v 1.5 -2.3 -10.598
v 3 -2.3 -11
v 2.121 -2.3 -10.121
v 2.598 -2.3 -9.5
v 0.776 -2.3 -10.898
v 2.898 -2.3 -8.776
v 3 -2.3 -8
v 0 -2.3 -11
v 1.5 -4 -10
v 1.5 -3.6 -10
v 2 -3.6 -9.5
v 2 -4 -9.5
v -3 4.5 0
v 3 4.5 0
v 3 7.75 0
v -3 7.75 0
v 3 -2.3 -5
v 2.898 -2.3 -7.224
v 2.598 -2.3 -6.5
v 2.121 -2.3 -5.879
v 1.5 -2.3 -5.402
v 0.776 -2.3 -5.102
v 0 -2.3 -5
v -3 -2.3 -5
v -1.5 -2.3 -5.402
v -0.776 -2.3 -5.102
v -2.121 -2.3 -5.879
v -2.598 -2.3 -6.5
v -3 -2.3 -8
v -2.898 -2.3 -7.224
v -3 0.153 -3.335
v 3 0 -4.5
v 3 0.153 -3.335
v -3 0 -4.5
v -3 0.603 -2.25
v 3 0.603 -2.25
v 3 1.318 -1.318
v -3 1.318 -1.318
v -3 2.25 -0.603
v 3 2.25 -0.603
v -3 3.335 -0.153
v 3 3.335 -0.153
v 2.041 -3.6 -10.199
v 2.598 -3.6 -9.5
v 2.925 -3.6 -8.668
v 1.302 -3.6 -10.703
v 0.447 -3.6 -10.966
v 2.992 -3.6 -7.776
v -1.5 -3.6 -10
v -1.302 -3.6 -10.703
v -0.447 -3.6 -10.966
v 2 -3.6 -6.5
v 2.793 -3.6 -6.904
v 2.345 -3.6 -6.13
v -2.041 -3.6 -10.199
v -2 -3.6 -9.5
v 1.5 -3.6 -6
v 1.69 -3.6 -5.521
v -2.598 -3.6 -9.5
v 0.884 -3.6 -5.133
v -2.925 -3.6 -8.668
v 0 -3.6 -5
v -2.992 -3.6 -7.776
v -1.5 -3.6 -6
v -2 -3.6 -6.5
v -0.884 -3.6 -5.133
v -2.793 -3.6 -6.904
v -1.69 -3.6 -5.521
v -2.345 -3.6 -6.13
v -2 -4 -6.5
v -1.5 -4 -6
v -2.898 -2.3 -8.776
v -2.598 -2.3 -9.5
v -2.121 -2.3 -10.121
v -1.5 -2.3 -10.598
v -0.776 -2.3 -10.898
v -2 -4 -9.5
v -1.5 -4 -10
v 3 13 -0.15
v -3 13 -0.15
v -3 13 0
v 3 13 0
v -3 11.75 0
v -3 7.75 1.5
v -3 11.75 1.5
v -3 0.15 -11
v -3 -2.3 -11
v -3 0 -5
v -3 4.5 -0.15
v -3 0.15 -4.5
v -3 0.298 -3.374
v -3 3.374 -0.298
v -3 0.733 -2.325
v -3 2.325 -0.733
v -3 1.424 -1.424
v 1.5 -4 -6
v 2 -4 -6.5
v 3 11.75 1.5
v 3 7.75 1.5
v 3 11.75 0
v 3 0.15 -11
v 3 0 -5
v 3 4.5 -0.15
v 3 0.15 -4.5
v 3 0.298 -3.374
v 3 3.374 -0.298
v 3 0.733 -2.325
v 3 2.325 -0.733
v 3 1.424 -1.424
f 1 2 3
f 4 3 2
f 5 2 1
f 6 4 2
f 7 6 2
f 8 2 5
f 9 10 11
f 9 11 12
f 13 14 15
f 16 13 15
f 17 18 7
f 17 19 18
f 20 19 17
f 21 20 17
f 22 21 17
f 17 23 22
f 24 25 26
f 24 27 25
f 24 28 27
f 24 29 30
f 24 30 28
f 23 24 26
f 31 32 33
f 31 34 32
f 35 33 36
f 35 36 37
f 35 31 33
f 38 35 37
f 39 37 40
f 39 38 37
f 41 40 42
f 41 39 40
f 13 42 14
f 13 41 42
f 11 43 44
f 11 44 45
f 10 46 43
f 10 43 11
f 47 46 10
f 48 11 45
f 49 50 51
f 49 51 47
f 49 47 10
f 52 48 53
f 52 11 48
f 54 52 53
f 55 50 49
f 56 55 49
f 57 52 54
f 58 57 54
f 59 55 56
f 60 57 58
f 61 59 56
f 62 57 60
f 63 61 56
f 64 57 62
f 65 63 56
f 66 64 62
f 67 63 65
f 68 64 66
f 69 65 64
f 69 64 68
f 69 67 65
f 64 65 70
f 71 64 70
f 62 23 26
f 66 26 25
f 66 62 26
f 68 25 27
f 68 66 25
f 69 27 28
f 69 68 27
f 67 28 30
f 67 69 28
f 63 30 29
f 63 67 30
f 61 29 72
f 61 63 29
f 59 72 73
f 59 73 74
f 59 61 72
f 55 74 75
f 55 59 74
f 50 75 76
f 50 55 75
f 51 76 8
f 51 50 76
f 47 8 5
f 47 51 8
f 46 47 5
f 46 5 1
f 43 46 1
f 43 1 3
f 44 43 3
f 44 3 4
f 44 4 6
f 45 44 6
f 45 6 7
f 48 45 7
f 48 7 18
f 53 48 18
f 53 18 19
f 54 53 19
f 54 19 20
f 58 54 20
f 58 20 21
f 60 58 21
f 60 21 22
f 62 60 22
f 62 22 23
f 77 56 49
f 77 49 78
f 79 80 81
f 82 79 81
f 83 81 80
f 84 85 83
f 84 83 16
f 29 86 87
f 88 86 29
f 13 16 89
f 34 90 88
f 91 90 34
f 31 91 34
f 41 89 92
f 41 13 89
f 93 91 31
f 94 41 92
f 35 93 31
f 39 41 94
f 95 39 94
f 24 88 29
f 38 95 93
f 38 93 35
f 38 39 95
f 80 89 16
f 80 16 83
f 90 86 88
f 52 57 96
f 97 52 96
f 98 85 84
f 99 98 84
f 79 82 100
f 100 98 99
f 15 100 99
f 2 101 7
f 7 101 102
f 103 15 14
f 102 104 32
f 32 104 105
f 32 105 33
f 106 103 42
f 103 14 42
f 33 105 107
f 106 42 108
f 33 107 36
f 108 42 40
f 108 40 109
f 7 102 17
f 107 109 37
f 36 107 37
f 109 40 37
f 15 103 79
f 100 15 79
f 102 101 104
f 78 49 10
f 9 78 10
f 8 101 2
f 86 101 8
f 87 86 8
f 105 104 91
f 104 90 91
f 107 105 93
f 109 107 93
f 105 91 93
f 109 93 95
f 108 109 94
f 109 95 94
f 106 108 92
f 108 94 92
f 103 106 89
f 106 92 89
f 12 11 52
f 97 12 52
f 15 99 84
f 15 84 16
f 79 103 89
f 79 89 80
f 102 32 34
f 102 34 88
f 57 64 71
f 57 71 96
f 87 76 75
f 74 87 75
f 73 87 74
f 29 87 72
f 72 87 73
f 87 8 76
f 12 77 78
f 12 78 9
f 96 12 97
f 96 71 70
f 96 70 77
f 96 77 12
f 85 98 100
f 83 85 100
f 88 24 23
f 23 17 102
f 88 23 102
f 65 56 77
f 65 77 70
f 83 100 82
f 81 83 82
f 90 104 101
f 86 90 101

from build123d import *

# Parameters (mm, degrees)
SCHIZZO1_W                   = 15.3
SCHIZZO1_H                   = 12.5
ESTRUSIONE_ESTRUSIONE1_DEPTH = 6
SCHIZZO2_W                   = 1.5
SCHIZZO2_H                   = 1.25
TAGLIO_ESTRUSIONE1_DEPTH     = 19.055470085
SCHIZZO3_W                   = 10.85
SCHIZZO3_H                   = 12.85
TAGLIO_ESTRUSIONE2_DEPTH     = 19.055470085
SCHIZZO4_W                   = 6.5
SCHIZZO4_H                   = 2.3
TAGLIO_ESTRUSIONE3_DEPTH     = 19.055470085
SCHIZZO5_W                   = 1.5
SCHIZZO5_H                   = 7.75
TAGLIO_ESTRUSIONE4_DEPTH     = 19.055470085
ESTRUSIONE_ESTRUSIONE2_REACH = 22.139
SCHIZZO6_R                   = 3
SCHIZZO7_W                   = 4
SCHIZZO7_H                   = 4
ESTRUSIONE_ESTRUSIONE3_DEPTH = 0.4
SMUSSO1_SIZE                 = 0.5
SMUSSO2_SIZE                 = 0.5
SMUSSO3_SIZE                 = 0.5
SMUSSO4_SIZE                 = 0.5
RACCORDO1_R                  = 4.35
RACCORDO2_R                  = 4.5


with BuildPart() as part:
    # Schizzo1 → Estrusione-Estrusione1 (new body)
    with BuildSketch(Plane(origin=(-3, 0, 0), x_dir=(0, -1, 0), z_dir=(-1, 0, 0))):
        with Locations((-5.35, -4.75)):
            Rectangle(SCHIZZO1_W, SCHIZZO1_H)
    extrude(amount=-ESTRUSIONE_ESTRUSIONE1_DEPTH)

    # Schizzo2 → Taglio-Estrusione1 (cut, through all)
    with BuildSketch(Plane(origin=(3, 0, 0), x_dir=(0, 0, -1), z_dir=(1, 0, 0))):
        with Locations((-0.75, 12.375)):
            Rectangle(SCHIZZO2_W, SCHIZZO2_H)
    extrude(amount=-TAGLIO_ESTRUSIONE1_DEPTH, mode=Mode.SUBTRACT)

    # Schizzo3 → Taglio-Estrusione2 (cut, through all)
    with BuildSketch(Plane(origin=(3, 0, 0), x_dir=(0, 0, -1), z_dir=(1, 0, 0))):
        with Locations((5.575, 6.575)):
            Rectangle(SCHIZZO3_W, SCHIZZO3_H)
    extrude(amount=-TAGLIO_ESTRUSIONE2_DEPTH, mode=Mode.SUBTRACT)

    # Schizzo4 → Taglio-Estrusione3 (cut, through all)
    with BuildSketch(Plane(origin=(3, 0, 0), x_dir=(0, 0, -1), z_dir=(1, 0, 0))):
        with Locations((1.75, -1.15)):
            Rectangle(SCHIZZO4_W, SCHIZZO4_H)
    extrude(amount=-TAGLIO_ESTRUSIONE3_DEPTH, mode=Mode.SUBTRACT)

    # Schizzo5 → Taglio-Estrusione4 (cut, through all)
    with BuildSketch(Plane(origin=(3, 0, 0), x_dir=(0, 0, -1), z_dir=(1, 0, 0))):
        with Locations((-0.75, 3.875)):
            Rectangle(SCHIZZO5_W, SCHIZZO5_H)
    extrude(amount=-TAGLIO_ESTRUSIONE4_DEPTH, mode=Mode.SUBTRACT)

    # Schizzo6 → Estrusione-Estrusione2 (add, up to next)
    with BuildSketch(Plane.XZ.offset(3.6), mode=Mode.PRIVATE) as estrusione_estrusione2_sk1:
        with Locations(Location((0, -8, 0), (0, 0, 90))):
            Circle(SCHIZZO6_R)
    estrusione_estrusione2_tool1 = extrude(estrusione_estrusione2_sk1.sketch, amount=-ESTRUSIONE_ESTRUSIONE2_REACH, mode=Mode.PRIVATE) - part.part
    add(estrusione_estrusione2_tool1.solids().sort_by_distance((0, -3.6, -8))[0])

    # Schizzo7 → Estrusione-Estrusione3 (add)
    with BuildSketch(Plane.XZ.offset(3.6)):
        with Locations((0, -8)):
            Rectangle(SCHIZZO7_W, SCHIZZO7_H)
    extrude(amount=ESTRUSIONE_ESTRUSIONE3_DEPTH)

    # Smusso1
    smusso1_edges = [part.edges().sort_by_distance(p)[0] for p in [
        (-2, -3.8, -10),
    ]]
    chamfer(smusso1_edges, length=SMUSSO1_SIZE)

    # Smusso2
    smusso2_edges = [part.edges().sort_by_distance(p)[0] for p in [
        (2, -3.8, -6),
    ]]
    chamfer(smusso2_edges, length=SMUSSO2_SIZE)

    # Smusso3
    smusso3_edges = [part.edges().sort_by_distance(p)[0] for p in [
        (-2, -3.8, -6),
    ]]
    chamfer(smusso3_edges, length=SMUSSO3_SIZE)

    # Smusso4
    smusso4_edges = [part.edges().sort_by_distance(p)[0] for p in [
        (2, -3.8, -10),
    ]]
    chamfer(smusso4_edges, length=SMUSSO4_SIZE)

    # Raccordo1
    raccordo1_edges = [part.edges().sort_by_distance(p)[0] for p in [
        (0, 0.15, -0.15),
    ]]
    fillet(raccordo1_edges, radius=RACCORDO1_R)

    # Raccordo2
    raccordo2_edges = [part.edges().sort_by_distance(p)[0] for p in [
        (0, 0, 0),
    ]]
    fillet(raccordo2_edges, radius=RACCORDO2_R)


solid = part.part
